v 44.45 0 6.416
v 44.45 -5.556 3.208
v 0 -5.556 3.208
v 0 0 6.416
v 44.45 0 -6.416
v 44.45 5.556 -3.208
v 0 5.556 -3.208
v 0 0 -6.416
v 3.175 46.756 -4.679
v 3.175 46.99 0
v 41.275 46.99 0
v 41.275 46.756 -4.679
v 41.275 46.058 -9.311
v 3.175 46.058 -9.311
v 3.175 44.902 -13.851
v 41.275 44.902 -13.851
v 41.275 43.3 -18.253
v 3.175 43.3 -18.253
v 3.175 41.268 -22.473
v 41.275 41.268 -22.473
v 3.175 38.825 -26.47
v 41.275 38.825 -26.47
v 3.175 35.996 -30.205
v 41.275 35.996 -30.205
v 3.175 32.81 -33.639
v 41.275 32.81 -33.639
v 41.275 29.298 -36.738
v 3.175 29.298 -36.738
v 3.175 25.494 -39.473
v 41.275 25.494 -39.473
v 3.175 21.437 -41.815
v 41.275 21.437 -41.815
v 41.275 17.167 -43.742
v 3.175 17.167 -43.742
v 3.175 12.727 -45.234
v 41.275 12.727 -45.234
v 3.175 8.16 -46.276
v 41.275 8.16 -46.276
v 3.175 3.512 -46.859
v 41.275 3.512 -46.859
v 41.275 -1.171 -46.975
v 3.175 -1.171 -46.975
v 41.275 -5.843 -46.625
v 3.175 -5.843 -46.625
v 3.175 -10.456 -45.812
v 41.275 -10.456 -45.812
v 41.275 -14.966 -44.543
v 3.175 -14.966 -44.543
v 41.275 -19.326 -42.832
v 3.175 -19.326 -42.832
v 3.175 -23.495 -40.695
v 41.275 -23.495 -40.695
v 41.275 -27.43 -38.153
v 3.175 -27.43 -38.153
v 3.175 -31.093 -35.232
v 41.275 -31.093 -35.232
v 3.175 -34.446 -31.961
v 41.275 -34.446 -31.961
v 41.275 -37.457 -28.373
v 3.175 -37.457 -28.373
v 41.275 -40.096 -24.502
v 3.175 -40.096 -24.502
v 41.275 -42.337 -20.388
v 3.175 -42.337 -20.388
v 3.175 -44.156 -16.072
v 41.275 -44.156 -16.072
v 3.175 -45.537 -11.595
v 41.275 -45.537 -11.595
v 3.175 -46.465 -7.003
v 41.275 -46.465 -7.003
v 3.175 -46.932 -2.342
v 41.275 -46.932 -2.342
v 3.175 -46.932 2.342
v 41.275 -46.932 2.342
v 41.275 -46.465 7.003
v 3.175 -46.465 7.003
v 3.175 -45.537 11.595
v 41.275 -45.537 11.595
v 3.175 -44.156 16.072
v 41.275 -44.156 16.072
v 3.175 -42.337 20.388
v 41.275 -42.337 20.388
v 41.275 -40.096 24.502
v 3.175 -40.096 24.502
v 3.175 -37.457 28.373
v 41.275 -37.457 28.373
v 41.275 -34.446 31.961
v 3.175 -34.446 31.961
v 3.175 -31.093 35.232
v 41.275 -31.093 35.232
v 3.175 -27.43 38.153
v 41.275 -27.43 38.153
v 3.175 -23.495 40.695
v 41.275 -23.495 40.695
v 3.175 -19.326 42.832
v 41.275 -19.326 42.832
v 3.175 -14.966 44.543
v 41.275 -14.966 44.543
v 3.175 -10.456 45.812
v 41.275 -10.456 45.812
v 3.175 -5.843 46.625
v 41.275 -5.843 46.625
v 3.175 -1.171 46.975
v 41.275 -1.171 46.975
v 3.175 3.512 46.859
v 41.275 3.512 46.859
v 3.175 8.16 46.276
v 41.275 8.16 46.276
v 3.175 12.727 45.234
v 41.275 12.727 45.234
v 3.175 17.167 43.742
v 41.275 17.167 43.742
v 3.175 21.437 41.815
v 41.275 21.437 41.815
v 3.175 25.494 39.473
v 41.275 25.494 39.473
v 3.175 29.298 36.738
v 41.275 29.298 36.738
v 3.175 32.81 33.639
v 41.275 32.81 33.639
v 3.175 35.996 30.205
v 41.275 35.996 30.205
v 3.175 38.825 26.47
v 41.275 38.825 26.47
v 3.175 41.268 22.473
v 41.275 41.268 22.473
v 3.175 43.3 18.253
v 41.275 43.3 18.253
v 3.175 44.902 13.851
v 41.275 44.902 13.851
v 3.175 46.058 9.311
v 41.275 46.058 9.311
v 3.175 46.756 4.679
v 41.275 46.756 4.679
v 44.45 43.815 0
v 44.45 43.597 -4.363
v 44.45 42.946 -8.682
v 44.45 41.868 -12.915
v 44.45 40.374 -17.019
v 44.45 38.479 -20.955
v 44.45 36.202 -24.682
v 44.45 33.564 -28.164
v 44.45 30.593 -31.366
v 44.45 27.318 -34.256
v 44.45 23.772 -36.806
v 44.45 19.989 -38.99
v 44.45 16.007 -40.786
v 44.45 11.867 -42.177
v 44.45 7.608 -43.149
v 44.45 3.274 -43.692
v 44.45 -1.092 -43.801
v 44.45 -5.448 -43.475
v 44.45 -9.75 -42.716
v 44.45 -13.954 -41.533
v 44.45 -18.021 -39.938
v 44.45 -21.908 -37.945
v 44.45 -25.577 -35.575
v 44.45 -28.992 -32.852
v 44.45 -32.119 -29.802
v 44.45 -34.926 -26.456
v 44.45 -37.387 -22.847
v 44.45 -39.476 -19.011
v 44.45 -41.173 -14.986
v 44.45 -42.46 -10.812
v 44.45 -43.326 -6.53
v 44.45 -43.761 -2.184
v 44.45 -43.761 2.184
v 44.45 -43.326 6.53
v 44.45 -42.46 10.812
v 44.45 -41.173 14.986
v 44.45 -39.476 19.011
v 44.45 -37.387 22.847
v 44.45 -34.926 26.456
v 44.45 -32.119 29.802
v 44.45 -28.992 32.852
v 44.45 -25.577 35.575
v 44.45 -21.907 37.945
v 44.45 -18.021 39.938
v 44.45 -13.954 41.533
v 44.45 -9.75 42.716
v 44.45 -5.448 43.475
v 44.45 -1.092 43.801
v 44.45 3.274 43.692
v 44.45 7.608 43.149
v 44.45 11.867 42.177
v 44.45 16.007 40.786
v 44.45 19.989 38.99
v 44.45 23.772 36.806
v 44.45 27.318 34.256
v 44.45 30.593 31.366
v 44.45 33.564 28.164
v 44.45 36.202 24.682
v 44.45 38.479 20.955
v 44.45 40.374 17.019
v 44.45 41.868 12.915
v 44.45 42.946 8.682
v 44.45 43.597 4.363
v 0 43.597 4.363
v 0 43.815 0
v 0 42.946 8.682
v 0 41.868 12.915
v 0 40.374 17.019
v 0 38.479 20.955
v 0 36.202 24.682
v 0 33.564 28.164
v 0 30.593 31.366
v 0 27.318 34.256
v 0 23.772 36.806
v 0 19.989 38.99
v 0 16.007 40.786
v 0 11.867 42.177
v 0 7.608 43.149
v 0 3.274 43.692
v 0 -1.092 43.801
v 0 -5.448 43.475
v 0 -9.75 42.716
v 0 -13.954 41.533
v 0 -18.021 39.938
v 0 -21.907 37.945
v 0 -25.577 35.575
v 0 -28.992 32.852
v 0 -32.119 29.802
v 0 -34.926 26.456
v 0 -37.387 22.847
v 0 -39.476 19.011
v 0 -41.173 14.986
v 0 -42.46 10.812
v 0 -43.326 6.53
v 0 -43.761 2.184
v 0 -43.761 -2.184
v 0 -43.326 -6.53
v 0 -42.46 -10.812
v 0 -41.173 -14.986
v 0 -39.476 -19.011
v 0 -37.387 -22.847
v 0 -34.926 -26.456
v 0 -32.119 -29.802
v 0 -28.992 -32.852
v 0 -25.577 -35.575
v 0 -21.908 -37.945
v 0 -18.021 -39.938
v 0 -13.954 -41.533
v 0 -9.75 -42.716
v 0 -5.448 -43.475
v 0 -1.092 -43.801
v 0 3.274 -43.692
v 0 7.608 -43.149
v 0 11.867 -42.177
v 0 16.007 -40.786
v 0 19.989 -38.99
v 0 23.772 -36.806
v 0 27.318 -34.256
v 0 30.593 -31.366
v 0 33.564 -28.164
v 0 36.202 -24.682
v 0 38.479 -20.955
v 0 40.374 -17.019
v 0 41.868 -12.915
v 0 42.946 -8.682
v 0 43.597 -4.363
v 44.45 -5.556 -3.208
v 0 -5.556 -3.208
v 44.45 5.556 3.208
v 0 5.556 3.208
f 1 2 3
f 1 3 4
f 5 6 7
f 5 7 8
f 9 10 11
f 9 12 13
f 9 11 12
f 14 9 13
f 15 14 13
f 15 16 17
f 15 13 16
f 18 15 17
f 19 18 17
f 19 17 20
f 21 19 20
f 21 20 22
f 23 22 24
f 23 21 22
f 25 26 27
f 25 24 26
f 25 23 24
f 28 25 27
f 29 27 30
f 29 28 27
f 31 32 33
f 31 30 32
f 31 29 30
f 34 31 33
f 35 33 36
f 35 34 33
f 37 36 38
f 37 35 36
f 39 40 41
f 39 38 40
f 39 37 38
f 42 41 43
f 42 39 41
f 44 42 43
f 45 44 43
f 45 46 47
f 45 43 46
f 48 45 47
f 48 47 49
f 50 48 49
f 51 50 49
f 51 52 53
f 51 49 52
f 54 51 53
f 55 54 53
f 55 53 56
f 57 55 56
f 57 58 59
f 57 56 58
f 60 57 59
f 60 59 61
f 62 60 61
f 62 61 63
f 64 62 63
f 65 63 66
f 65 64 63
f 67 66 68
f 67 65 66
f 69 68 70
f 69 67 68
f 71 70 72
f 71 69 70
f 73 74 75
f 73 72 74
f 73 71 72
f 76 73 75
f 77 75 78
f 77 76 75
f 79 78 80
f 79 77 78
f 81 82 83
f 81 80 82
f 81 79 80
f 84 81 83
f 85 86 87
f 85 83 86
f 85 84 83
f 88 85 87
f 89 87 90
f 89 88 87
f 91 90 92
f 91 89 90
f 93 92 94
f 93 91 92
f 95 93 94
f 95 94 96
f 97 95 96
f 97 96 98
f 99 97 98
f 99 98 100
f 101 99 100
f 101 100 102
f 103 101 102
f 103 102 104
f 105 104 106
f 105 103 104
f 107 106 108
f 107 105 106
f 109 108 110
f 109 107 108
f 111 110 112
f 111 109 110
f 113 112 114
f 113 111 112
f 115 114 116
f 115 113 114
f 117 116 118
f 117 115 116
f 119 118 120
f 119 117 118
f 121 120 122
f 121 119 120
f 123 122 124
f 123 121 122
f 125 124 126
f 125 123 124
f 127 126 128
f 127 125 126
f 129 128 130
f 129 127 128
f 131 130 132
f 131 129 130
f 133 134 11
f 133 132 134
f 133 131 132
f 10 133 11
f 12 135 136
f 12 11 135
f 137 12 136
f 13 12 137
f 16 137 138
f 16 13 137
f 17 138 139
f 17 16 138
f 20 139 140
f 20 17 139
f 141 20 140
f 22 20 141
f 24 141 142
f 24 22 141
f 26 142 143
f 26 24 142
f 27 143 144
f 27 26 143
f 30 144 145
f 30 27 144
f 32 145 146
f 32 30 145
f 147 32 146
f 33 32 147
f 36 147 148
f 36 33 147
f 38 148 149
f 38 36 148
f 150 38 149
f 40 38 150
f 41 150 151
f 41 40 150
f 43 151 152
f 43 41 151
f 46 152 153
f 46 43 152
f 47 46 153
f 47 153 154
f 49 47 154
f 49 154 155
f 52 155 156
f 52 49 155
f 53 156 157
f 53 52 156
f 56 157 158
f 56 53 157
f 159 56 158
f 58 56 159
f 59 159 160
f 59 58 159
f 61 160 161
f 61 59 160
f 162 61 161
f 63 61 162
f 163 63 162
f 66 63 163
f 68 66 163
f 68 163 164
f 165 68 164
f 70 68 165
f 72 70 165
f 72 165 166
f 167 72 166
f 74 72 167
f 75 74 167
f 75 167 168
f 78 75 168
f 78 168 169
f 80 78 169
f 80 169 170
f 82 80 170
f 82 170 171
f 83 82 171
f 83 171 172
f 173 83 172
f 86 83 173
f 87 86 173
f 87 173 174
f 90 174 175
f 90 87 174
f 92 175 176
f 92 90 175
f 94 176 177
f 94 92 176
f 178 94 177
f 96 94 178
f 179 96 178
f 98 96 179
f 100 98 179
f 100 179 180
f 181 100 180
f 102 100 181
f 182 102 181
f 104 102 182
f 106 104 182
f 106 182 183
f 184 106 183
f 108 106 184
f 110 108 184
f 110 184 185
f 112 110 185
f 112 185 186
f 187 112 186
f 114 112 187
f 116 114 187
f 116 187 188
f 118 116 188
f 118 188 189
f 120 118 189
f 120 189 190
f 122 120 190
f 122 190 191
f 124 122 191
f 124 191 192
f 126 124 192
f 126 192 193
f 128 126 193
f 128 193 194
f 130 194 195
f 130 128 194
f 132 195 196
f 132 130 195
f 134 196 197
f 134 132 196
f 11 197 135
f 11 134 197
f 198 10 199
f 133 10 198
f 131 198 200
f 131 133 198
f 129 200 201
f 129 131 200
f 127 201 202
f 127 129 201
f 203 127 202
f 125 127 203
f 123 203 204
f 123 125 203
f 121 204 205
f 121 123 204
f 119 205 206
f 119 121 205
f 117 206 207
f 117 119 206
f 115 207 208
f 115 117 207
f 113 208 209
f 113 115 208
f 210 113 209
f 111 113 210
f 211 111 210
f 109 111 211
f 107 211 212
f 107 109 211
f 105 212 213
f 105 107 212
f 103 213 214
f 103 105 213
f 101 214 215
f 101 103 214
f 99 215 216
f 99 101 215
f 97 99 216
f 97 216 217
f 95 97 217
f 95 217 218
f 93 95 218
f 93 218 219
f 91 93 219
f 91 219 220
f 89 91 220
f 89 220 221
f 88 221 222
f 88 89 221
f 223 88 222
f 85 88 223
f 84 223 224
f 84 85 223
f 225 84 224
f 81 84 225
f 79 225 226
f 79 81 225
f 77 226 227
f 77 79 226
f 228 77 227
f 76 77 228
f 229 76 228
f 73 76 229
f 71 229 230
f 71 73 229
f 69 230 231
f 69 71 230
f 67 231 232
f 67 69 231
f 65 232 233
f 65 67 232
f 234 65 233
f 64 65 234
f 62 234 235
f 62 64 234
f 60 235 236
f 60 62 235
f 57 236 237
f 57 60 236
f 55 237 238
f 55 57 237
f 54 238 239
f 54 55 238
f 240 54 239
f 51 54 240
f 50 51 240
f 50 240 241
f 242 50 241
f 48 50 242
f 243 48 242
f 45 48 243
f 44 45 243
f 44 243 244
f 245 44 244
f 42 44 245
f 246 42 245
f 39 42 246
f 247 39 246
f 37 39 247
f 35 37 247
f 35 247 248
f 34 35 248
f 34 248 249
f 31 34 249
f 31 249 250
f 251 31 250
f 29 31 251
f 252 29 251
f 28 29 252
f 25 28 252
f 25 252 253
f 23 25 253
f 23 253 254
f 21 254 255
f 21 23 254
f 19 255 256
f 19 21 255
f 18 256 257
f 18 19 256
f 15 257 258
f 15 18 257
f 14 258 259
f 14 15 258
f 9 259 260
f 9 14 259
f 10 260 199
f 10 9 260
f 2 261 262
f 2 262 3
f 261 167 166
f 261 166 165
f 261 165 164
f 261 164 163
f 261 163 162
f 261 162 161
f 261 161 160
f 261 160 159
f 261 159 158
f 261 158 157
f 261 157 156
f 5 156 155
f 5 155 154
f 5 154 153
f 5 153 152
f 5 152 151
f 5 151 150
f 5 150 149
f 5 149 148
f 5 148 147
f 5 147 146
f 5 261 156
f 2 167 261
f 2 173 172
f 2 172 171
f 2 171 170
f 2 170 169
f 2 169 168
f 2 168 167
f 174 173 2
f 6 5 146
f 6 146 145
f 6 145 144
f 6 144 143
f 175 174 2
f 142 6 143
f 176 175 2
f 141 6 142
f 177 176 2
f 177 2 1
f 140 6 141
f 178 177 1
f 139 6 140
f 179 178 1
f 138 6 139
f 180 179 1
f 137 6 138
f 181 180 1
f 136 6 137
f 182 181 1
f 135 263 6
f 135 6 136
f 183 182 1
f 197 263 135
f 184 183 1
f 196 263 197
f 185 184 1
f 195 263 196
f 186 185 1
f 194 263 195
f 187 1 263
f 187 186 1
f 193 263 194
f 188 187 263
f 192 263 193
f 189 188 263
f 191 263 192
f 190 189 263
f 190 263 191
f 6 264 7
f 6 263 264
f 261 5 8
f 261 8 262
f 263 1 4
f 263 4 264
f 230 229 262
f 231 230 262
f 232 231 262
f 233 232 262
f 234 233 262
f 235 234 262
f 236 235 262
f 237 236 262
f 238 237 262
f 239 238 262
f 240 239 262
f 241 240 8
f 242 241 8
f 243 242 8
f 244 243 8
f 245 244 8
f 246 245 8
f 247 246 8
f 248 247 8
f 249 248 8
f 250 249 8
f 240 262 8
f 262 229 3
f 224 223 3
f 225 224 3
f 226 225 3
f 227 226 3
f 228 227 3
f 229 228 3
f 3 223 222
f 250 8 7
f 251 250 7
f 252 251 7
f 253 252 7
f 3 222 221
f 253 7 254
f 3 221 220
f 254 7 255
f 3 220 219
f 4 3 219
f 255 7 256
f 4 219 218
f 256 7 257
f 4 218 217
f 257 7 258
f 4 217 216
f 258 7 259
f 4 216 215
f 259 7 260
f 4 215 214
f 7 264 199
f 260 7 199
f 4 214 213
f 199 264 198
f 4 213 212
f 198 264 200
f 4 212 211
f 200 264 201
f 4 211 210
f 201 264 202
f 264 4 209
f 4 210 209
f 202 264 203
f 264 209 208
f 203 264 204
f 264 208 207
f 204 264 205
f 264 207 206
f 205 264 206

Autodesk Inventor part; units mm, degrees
ref_plane "YZ Plane" through (0, 0, 0) normal (1, 0, 0) x (0, 1, 0)
ref_plane "XZ Plane" through (0, 0, 0) normal (0, 1, 0) x (-1, 0, 0)
ref_plane "XY Plane" through (0, 0, 0) normal (0, 0, 1) x (1, 0, 0)
sketch "Sketch1" plane through (0, 0, 0) normal (0, 0, 1) x (1, 0, 0)
  line L0 (0, 0) -> (44.45, 0)
  line L1 (44.45, 0) -> (44.45, 46.99)
  line L2 (44.45, 46.99) -> (0, 46.99)
  line L3 (0, 46.99) -> (0, 0)
  dimension "d0" = 46.99
  dimension "d1" = 44.45
revolve "Revolution1" add sketch "Sketch1" angle 360 about axis through (0, 0, 0) along (1, 0, 0)
chamfer "Chamfer1" distance 3.175 angle 45 2 edges at (44.45, -46.99, 0) (0, -46.99, 0)
sketch "Sketch2" plane through (44.45, 0, 0) normal (1, 0, 0) x (0, 0, -1)
  circle A0 centre (0, 0) radius 43.815 projected
  line L0 (6.4158, 0) -> (3.2079, -5.5562)
  line L1 (3.2079, -5.5562) -> (-3.2079, -5.5562)
  line L2 (-3.2079, -5.5562) -> (-6.4158, 0)
  line L3 (-6.4158, 0) -> (-3.2079, 5.5563)
  line L4 (-3.2079, 5.5563) -> (3.2079, 5.5563)
  line L5 (3.2079, 5.5563) -> (6.4158, 0)
  dimension "d6" = 11.1125
extrude "Extrusion1" cut sketch "Sketch2" against normal through all contours L0 L1 L2 L3 L4 L5
properties part number "Wheel Temp"
